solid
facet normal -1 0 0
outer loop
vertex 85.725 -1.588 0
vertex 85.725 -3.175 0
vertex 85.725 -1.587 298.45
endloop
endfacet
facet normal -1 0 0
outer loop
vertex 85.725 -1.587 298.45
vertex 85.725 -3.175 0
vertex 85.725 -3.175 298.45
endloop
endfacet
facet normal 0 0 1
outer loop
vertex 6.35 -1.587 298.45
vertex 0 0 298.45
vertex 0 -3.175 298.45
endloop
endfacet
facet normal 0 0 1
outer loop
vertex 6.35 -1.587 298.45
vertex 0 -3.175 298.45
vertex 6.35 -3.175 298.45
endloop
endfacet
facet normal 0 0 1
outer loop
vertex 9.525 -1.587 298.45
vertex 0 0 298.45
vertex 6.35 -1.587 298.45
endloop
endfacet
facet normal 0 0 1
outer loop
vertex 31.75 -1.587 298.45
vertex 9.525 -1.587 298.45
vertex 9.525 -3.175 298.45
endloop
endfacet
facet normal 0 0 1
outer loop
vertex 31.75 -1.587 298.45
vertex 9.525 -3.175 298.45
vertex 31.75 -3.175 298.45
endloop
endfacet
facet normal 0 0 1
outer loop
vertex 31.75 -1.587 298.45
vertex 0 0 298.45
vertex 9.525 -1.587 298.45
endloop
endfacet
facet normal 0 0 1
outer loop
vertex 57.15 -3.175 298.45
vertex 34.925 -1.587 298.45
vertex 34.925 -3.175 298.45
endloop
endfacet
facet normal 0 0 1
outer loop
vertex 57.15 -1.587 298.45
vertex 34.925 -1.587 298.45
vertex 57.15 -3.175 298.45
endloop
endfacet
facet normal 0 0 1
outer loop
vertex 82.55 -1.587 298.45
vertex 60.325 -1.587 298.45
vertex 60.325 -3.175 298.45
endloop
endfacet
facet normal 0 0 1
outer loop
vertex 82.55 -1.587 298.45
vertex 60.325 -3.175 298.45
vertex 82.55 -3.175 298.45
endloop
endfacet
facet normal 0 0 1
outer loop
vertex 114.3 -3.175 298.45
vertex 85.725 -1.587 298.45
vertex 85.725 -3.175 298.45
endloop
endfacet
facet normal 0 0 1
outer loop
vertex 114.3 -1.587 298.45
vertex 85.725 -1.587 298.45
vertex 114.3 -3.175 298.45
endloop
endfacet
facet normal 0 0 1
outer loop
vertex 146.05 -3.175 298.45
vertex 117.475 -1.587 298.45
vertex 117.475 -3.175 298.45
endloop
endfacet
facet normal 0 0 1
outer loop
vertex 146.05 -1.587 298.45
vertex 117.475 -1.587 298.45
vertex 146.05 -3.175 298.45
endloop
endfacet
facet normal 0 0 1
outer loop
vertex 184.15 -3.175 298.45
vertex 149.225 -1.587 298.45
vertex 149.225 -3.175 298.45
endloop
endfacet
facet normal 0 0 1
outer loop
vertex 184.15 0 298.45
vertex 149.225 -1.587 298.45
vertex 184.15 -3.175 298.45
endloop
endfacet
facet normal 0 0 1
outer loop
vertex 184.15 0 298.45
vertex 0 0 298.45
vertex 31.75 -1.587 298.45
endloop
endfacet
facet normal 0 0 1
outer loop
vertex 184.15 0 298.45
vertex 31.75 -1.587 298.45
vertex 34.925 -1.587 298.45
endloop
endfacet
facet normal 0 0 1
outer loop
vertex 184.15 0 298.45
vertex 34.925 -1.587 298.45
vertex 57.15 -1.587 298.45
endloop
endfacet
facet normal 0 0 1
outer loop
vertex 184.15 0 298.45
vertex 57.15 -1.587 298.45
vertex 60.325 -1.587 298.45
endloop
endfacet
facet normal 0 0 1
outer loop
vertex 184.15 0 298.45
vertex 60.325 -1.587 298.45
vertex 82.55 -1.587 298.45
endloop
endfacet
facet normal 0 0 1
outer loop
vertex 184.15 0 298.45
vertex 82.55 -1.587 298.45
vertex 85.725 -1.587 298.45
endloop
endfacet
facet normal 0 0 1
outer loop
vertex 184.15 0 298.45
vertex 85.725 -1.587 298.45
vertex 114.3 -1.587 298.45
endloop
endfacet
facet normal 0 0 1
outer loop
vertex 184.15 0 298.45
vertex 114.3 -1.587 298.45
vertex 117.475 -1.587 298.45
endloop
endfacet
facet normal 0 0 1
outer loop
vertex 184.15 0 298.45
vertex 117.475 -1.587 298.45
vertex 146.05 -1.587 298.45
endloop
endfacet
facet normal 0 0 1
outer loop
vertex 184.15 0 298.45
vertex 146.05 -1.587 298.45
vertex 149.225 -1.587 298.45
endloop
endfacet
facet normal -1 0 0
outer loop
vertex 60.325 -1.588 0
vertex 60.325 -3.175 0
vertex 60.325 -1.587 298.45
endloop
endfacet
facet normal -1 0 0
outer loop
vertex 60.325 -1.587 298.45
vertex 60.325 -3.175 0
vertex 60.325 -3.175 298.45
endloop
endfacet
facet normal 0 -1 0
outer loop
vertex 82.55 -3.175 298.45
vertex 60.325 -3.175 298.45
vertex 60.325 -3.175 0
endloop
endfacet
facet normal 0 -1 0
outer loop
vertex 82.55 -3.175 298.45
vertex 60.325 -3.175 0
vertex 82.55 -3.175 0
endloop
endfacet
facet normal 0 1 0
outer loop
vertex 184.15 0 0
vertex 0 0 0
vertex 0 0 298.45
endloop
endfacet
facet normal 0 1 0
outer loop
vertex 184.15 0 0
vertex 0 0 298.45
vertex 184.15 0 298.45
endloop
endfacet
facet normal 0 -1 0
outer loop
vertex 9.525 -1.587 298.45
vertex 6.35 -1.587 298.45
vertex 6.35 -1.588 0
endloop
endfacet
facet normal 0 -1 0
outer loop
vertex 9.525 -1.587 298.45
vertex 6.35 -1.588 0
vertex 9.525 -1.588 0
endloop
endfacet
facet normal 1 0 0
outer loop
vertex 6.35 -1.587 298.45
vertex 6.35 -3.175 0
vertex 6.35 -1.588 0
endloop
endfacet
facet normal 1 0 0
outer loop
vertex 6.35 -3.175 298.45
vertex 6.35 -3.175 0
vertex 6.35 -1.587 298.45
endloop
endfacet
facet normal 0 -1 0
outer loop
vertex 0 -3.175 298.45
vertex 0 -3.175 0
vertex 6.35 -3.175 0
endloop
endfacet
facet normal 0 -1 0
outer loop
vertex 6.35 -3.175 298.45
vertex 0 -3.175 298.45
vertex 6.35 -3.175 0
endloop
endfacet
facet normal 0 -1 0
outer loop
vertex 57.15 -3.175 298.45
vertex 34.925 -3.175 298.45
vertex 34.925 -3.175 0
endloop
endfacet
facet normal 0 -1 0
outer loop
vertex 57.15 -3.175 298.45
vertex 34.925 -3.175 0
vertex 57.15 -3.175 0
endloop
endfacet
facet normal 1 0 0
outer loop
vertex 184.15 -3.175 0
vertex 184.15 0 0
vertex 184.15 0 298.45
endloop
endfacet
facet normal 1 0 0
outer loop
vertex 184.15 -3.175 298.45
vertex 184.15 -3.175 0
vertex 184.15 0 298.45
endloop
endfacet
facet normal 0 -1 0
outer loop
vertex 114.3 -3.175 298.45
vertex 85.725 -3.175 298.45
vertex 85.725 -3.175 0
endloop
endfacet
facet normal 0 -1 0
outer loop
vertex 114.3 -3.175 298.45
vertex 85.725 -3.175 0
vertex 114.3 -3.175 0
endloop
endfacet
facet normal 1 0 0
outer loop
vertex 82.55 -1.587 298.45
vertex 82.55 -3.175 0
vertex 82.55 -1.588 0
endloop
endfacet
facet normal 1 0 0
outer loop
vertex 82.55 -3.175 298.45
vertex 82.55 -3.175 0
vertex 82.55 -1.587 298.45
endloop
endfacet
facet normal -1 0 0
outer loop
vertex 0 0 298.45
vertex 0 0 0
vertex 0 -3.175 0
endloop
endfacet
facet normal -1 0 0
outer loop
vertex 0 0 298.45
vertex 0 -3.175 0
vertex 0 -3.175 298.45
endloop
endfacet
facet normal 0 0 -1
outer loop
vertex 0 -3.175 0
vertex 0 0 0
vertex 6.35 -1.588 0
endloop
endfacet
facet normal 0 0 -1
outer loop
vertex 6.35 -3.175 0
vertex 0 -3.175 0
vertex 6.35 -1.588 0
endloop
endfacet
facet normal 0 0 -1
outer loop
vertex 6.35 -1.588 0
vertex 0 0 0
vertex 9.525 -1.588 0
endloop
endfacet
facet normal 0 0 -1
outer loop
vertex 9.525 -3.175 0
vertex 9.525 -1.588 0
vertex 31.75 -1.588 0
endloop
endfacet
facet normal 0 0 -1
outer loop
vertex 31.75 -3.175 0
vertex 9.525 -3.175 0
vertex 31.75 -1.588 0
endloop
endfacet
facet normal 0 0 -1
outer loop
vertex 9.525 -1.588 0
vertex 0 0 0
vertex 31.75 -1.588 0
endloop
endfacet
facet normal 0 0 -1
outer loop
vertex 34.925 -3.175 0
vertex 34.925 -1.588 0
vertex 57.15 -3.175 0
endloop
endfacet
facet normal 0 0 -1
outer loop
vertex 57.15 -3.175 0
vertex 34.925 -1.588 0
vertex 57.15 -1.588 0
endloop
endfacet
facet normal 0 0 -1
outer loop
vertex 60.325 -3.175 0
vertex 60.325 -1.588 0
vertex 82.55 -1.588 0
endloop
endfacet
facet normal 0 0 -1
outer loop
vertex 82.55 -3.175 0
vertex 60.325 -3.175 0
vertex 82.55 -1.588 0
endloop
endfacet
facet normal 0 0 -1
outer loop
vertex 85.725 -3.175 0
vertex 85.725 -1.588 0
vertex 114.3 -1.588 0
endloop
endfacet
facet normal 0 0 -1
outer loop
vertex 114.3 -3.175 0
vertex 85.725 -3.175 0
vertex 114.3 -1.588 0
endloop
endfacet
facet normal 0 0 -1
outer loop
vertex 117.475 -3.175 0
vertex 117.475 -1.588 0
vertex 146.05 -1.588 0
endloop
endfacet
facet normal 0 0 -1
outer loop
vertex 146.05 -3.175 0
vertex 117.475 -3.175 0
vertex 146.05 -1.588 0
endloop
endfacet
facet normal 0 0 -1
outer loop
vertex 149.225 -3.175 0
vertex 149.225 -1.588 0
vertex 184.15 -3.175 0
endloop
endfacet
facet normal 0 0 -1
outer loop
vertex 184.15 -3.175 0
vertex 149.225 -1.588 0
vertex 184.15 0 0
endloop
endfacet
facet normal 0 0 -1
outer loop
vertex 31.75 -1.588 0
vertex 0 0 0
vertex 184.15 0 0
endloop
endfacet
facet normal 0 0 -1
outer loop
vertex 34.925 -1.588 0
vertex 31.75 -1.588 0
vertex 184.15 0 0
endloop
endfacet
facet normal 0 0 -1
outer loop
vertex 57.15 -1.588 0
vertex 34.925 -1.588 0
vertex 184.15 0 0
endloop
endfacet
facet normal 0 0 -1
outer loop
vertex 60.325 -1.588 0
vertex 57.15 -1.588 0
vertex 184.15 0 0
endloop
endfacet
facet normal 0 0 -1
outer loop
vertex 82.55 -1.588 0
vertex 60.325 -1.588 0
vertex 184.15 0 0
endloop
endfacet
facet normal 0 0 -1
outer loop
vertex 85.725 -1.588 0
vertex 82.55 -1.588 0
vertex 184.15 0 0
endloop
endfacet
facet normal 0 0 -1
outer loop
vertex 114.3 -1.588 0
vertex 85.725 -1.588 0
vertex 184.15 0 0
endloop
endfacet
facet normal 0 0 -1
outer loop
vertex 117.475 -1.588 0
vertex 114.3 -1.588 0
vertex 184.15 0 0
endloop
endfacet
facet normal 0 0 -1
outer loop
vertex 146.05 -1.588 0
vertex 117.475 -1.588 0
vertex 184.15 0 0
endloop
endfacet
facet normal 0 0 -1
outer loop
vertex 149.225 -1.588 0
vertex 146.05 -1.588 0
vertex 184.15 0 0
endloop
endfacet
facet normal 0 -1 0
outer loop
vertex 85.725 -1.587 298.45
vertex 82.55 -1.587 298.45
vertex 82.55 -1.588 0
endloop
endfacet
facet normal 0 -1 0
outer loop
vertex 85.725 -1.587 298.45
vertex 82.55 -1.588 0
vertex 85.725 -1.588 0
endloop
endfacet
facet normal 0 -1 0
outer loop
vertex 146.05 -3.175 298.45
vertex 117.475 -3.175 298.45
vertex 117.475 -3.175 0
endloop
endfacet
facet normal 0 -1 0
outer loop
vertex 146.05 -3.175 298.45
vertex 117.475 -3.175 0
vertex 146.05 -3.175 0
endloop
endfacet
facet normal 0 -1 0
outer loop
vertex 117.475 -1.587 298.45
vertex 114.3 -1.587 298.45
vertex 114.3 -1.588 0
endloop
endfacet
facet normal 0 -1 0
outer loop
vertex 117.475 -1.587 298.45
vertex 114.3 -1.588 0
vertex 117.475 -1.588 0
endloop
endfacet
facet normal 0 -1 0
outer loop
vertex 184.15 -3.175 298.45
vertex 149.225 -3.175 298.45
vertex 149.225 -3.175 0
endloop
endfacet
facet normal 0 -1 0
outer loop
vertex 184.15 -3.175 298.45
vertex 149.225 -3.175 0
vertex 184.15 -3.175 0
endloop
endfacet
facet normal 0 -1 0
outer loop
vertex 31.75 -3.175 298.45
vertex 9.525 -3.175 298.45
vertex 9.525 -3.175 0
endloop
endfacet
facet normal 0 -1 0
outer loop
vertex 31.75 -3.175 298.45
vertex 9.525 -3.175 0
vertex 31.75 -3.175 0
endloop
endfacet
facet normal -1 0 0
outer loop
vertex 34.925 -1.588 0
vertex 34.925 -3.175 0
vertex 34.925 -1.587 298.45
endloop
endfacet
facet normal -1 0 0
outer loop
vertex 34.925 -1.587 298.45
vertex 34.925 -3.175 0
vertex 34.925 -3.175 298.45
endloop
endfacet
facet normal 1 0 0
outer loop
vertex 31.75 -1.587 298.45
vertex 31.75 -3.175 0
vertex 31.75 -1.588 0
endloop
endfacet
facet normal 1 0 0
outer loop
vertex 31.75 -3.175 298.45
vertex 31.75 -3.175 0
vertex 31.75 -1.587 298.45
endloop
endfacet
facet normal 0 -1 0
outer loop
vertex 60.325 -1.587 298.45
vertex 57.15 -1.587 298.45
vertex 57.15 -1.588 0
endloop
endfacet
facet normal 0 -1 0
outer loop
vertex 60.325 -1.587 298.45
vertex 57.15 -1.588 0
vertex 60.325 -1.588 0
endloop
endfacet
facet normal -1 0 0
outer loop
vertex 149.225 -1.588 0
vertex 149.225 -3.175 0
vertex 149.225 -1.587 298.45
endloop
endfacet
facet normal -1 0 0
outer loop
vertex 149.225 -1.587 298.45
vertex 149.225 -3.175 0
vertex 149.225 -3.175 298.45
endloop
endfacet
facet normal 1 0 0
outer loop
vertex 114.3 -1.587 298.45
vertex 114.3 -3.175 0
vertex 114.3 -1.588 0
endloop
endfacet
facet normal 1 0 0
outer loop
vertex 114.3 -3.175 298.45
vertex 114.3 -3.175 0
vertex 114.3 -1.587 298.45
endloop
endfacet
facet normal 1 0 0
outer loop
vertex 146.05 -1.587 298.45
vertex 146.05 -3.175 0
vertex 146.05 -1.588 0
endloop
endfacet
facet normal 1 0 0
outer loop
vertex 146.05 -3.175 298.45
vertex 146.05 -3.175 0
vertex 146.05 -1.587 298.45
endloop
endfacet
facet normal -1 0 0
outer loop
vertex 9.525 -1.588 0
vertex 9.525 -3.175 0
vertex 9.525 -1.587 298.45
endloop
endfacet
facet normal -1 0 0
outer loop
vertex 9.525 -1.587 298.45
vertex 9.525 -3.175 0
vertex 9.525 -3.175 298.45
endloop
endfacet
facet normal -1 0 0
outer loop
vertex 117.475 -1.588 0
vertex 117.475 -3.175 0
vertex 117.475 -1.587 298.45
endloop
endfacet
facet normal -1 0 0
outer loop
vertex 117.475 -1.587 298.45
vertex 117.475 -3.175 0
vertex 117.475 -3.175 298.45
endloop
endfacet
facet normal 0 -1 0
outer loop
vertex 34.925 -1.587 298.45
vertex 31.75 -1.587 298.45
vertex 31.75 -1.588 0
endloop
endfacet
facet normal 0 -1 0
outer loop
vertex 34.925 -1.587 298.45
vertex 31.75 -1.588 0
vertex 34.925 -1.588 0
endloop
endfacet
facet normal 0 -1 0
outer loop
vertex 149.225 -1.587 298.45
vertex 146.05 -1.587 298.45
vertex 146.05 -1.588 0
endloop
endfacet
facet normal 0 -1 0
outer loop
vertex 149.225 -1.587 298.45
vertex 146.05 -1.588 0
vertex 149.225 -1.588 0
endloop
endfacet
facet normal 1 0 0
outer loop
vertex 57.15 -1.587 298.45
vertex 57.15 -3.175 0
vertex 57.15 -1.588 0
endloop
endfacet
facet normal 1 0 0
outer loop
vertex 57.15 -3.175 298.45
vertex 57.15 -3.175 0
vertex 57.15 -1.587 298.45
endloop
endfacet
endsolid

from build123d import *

# Parameters (mm, degrees)
F0_W     = 184.15
F0_H     = 298.45
F1_DEPTH = 3.175
F2_W     = 3.175
F2_H     = 298.45
F3_DEPTH = 1.5875
F4_ANGLE = 90


with BuildPart() as f1:
    # F0 (on Top) → F1 (new body)
    with BuildSketch(Plane.XY):
        with Locations((92.075, 149.225)):
            Rectangle(F0_W, F0_H)
    extrude(amount=F1_DEPTH)

    # F2 (on face) → F3 (cut)
    with BuildSketch(Plane.XY.offset(3.175)):
        with Locations((7.9375, 149.225)):
            Rectangle(F2_W, F2_H)
        with Locations((33.3375, 149.225)):
            Rectangle(F2_W, F2_H)
        with Locations((58.7375, 149.225)):
            Rectangle(F2_W, F2_H)
        with Locations((84.1375, 149.225)):
            Rectangle(F2_W, F2_H)
        with Locations((115.8875, 149.225)):
            Rectangle(F2_W, F2_H)
        with Locations((147.6375, 149.225)):
            Rectangle(F2_W, F2_H)
    extrude(amount=-F3_DEPTH, mode=Mode.SUBTRACT)


with BuildPart() as f1_1:
    # F4: moved
    add(f1.part.rotate(Axis((92.075, 0, 0), (1, 0, 0)), F4_ANGLE))


solid = f1_1.part
